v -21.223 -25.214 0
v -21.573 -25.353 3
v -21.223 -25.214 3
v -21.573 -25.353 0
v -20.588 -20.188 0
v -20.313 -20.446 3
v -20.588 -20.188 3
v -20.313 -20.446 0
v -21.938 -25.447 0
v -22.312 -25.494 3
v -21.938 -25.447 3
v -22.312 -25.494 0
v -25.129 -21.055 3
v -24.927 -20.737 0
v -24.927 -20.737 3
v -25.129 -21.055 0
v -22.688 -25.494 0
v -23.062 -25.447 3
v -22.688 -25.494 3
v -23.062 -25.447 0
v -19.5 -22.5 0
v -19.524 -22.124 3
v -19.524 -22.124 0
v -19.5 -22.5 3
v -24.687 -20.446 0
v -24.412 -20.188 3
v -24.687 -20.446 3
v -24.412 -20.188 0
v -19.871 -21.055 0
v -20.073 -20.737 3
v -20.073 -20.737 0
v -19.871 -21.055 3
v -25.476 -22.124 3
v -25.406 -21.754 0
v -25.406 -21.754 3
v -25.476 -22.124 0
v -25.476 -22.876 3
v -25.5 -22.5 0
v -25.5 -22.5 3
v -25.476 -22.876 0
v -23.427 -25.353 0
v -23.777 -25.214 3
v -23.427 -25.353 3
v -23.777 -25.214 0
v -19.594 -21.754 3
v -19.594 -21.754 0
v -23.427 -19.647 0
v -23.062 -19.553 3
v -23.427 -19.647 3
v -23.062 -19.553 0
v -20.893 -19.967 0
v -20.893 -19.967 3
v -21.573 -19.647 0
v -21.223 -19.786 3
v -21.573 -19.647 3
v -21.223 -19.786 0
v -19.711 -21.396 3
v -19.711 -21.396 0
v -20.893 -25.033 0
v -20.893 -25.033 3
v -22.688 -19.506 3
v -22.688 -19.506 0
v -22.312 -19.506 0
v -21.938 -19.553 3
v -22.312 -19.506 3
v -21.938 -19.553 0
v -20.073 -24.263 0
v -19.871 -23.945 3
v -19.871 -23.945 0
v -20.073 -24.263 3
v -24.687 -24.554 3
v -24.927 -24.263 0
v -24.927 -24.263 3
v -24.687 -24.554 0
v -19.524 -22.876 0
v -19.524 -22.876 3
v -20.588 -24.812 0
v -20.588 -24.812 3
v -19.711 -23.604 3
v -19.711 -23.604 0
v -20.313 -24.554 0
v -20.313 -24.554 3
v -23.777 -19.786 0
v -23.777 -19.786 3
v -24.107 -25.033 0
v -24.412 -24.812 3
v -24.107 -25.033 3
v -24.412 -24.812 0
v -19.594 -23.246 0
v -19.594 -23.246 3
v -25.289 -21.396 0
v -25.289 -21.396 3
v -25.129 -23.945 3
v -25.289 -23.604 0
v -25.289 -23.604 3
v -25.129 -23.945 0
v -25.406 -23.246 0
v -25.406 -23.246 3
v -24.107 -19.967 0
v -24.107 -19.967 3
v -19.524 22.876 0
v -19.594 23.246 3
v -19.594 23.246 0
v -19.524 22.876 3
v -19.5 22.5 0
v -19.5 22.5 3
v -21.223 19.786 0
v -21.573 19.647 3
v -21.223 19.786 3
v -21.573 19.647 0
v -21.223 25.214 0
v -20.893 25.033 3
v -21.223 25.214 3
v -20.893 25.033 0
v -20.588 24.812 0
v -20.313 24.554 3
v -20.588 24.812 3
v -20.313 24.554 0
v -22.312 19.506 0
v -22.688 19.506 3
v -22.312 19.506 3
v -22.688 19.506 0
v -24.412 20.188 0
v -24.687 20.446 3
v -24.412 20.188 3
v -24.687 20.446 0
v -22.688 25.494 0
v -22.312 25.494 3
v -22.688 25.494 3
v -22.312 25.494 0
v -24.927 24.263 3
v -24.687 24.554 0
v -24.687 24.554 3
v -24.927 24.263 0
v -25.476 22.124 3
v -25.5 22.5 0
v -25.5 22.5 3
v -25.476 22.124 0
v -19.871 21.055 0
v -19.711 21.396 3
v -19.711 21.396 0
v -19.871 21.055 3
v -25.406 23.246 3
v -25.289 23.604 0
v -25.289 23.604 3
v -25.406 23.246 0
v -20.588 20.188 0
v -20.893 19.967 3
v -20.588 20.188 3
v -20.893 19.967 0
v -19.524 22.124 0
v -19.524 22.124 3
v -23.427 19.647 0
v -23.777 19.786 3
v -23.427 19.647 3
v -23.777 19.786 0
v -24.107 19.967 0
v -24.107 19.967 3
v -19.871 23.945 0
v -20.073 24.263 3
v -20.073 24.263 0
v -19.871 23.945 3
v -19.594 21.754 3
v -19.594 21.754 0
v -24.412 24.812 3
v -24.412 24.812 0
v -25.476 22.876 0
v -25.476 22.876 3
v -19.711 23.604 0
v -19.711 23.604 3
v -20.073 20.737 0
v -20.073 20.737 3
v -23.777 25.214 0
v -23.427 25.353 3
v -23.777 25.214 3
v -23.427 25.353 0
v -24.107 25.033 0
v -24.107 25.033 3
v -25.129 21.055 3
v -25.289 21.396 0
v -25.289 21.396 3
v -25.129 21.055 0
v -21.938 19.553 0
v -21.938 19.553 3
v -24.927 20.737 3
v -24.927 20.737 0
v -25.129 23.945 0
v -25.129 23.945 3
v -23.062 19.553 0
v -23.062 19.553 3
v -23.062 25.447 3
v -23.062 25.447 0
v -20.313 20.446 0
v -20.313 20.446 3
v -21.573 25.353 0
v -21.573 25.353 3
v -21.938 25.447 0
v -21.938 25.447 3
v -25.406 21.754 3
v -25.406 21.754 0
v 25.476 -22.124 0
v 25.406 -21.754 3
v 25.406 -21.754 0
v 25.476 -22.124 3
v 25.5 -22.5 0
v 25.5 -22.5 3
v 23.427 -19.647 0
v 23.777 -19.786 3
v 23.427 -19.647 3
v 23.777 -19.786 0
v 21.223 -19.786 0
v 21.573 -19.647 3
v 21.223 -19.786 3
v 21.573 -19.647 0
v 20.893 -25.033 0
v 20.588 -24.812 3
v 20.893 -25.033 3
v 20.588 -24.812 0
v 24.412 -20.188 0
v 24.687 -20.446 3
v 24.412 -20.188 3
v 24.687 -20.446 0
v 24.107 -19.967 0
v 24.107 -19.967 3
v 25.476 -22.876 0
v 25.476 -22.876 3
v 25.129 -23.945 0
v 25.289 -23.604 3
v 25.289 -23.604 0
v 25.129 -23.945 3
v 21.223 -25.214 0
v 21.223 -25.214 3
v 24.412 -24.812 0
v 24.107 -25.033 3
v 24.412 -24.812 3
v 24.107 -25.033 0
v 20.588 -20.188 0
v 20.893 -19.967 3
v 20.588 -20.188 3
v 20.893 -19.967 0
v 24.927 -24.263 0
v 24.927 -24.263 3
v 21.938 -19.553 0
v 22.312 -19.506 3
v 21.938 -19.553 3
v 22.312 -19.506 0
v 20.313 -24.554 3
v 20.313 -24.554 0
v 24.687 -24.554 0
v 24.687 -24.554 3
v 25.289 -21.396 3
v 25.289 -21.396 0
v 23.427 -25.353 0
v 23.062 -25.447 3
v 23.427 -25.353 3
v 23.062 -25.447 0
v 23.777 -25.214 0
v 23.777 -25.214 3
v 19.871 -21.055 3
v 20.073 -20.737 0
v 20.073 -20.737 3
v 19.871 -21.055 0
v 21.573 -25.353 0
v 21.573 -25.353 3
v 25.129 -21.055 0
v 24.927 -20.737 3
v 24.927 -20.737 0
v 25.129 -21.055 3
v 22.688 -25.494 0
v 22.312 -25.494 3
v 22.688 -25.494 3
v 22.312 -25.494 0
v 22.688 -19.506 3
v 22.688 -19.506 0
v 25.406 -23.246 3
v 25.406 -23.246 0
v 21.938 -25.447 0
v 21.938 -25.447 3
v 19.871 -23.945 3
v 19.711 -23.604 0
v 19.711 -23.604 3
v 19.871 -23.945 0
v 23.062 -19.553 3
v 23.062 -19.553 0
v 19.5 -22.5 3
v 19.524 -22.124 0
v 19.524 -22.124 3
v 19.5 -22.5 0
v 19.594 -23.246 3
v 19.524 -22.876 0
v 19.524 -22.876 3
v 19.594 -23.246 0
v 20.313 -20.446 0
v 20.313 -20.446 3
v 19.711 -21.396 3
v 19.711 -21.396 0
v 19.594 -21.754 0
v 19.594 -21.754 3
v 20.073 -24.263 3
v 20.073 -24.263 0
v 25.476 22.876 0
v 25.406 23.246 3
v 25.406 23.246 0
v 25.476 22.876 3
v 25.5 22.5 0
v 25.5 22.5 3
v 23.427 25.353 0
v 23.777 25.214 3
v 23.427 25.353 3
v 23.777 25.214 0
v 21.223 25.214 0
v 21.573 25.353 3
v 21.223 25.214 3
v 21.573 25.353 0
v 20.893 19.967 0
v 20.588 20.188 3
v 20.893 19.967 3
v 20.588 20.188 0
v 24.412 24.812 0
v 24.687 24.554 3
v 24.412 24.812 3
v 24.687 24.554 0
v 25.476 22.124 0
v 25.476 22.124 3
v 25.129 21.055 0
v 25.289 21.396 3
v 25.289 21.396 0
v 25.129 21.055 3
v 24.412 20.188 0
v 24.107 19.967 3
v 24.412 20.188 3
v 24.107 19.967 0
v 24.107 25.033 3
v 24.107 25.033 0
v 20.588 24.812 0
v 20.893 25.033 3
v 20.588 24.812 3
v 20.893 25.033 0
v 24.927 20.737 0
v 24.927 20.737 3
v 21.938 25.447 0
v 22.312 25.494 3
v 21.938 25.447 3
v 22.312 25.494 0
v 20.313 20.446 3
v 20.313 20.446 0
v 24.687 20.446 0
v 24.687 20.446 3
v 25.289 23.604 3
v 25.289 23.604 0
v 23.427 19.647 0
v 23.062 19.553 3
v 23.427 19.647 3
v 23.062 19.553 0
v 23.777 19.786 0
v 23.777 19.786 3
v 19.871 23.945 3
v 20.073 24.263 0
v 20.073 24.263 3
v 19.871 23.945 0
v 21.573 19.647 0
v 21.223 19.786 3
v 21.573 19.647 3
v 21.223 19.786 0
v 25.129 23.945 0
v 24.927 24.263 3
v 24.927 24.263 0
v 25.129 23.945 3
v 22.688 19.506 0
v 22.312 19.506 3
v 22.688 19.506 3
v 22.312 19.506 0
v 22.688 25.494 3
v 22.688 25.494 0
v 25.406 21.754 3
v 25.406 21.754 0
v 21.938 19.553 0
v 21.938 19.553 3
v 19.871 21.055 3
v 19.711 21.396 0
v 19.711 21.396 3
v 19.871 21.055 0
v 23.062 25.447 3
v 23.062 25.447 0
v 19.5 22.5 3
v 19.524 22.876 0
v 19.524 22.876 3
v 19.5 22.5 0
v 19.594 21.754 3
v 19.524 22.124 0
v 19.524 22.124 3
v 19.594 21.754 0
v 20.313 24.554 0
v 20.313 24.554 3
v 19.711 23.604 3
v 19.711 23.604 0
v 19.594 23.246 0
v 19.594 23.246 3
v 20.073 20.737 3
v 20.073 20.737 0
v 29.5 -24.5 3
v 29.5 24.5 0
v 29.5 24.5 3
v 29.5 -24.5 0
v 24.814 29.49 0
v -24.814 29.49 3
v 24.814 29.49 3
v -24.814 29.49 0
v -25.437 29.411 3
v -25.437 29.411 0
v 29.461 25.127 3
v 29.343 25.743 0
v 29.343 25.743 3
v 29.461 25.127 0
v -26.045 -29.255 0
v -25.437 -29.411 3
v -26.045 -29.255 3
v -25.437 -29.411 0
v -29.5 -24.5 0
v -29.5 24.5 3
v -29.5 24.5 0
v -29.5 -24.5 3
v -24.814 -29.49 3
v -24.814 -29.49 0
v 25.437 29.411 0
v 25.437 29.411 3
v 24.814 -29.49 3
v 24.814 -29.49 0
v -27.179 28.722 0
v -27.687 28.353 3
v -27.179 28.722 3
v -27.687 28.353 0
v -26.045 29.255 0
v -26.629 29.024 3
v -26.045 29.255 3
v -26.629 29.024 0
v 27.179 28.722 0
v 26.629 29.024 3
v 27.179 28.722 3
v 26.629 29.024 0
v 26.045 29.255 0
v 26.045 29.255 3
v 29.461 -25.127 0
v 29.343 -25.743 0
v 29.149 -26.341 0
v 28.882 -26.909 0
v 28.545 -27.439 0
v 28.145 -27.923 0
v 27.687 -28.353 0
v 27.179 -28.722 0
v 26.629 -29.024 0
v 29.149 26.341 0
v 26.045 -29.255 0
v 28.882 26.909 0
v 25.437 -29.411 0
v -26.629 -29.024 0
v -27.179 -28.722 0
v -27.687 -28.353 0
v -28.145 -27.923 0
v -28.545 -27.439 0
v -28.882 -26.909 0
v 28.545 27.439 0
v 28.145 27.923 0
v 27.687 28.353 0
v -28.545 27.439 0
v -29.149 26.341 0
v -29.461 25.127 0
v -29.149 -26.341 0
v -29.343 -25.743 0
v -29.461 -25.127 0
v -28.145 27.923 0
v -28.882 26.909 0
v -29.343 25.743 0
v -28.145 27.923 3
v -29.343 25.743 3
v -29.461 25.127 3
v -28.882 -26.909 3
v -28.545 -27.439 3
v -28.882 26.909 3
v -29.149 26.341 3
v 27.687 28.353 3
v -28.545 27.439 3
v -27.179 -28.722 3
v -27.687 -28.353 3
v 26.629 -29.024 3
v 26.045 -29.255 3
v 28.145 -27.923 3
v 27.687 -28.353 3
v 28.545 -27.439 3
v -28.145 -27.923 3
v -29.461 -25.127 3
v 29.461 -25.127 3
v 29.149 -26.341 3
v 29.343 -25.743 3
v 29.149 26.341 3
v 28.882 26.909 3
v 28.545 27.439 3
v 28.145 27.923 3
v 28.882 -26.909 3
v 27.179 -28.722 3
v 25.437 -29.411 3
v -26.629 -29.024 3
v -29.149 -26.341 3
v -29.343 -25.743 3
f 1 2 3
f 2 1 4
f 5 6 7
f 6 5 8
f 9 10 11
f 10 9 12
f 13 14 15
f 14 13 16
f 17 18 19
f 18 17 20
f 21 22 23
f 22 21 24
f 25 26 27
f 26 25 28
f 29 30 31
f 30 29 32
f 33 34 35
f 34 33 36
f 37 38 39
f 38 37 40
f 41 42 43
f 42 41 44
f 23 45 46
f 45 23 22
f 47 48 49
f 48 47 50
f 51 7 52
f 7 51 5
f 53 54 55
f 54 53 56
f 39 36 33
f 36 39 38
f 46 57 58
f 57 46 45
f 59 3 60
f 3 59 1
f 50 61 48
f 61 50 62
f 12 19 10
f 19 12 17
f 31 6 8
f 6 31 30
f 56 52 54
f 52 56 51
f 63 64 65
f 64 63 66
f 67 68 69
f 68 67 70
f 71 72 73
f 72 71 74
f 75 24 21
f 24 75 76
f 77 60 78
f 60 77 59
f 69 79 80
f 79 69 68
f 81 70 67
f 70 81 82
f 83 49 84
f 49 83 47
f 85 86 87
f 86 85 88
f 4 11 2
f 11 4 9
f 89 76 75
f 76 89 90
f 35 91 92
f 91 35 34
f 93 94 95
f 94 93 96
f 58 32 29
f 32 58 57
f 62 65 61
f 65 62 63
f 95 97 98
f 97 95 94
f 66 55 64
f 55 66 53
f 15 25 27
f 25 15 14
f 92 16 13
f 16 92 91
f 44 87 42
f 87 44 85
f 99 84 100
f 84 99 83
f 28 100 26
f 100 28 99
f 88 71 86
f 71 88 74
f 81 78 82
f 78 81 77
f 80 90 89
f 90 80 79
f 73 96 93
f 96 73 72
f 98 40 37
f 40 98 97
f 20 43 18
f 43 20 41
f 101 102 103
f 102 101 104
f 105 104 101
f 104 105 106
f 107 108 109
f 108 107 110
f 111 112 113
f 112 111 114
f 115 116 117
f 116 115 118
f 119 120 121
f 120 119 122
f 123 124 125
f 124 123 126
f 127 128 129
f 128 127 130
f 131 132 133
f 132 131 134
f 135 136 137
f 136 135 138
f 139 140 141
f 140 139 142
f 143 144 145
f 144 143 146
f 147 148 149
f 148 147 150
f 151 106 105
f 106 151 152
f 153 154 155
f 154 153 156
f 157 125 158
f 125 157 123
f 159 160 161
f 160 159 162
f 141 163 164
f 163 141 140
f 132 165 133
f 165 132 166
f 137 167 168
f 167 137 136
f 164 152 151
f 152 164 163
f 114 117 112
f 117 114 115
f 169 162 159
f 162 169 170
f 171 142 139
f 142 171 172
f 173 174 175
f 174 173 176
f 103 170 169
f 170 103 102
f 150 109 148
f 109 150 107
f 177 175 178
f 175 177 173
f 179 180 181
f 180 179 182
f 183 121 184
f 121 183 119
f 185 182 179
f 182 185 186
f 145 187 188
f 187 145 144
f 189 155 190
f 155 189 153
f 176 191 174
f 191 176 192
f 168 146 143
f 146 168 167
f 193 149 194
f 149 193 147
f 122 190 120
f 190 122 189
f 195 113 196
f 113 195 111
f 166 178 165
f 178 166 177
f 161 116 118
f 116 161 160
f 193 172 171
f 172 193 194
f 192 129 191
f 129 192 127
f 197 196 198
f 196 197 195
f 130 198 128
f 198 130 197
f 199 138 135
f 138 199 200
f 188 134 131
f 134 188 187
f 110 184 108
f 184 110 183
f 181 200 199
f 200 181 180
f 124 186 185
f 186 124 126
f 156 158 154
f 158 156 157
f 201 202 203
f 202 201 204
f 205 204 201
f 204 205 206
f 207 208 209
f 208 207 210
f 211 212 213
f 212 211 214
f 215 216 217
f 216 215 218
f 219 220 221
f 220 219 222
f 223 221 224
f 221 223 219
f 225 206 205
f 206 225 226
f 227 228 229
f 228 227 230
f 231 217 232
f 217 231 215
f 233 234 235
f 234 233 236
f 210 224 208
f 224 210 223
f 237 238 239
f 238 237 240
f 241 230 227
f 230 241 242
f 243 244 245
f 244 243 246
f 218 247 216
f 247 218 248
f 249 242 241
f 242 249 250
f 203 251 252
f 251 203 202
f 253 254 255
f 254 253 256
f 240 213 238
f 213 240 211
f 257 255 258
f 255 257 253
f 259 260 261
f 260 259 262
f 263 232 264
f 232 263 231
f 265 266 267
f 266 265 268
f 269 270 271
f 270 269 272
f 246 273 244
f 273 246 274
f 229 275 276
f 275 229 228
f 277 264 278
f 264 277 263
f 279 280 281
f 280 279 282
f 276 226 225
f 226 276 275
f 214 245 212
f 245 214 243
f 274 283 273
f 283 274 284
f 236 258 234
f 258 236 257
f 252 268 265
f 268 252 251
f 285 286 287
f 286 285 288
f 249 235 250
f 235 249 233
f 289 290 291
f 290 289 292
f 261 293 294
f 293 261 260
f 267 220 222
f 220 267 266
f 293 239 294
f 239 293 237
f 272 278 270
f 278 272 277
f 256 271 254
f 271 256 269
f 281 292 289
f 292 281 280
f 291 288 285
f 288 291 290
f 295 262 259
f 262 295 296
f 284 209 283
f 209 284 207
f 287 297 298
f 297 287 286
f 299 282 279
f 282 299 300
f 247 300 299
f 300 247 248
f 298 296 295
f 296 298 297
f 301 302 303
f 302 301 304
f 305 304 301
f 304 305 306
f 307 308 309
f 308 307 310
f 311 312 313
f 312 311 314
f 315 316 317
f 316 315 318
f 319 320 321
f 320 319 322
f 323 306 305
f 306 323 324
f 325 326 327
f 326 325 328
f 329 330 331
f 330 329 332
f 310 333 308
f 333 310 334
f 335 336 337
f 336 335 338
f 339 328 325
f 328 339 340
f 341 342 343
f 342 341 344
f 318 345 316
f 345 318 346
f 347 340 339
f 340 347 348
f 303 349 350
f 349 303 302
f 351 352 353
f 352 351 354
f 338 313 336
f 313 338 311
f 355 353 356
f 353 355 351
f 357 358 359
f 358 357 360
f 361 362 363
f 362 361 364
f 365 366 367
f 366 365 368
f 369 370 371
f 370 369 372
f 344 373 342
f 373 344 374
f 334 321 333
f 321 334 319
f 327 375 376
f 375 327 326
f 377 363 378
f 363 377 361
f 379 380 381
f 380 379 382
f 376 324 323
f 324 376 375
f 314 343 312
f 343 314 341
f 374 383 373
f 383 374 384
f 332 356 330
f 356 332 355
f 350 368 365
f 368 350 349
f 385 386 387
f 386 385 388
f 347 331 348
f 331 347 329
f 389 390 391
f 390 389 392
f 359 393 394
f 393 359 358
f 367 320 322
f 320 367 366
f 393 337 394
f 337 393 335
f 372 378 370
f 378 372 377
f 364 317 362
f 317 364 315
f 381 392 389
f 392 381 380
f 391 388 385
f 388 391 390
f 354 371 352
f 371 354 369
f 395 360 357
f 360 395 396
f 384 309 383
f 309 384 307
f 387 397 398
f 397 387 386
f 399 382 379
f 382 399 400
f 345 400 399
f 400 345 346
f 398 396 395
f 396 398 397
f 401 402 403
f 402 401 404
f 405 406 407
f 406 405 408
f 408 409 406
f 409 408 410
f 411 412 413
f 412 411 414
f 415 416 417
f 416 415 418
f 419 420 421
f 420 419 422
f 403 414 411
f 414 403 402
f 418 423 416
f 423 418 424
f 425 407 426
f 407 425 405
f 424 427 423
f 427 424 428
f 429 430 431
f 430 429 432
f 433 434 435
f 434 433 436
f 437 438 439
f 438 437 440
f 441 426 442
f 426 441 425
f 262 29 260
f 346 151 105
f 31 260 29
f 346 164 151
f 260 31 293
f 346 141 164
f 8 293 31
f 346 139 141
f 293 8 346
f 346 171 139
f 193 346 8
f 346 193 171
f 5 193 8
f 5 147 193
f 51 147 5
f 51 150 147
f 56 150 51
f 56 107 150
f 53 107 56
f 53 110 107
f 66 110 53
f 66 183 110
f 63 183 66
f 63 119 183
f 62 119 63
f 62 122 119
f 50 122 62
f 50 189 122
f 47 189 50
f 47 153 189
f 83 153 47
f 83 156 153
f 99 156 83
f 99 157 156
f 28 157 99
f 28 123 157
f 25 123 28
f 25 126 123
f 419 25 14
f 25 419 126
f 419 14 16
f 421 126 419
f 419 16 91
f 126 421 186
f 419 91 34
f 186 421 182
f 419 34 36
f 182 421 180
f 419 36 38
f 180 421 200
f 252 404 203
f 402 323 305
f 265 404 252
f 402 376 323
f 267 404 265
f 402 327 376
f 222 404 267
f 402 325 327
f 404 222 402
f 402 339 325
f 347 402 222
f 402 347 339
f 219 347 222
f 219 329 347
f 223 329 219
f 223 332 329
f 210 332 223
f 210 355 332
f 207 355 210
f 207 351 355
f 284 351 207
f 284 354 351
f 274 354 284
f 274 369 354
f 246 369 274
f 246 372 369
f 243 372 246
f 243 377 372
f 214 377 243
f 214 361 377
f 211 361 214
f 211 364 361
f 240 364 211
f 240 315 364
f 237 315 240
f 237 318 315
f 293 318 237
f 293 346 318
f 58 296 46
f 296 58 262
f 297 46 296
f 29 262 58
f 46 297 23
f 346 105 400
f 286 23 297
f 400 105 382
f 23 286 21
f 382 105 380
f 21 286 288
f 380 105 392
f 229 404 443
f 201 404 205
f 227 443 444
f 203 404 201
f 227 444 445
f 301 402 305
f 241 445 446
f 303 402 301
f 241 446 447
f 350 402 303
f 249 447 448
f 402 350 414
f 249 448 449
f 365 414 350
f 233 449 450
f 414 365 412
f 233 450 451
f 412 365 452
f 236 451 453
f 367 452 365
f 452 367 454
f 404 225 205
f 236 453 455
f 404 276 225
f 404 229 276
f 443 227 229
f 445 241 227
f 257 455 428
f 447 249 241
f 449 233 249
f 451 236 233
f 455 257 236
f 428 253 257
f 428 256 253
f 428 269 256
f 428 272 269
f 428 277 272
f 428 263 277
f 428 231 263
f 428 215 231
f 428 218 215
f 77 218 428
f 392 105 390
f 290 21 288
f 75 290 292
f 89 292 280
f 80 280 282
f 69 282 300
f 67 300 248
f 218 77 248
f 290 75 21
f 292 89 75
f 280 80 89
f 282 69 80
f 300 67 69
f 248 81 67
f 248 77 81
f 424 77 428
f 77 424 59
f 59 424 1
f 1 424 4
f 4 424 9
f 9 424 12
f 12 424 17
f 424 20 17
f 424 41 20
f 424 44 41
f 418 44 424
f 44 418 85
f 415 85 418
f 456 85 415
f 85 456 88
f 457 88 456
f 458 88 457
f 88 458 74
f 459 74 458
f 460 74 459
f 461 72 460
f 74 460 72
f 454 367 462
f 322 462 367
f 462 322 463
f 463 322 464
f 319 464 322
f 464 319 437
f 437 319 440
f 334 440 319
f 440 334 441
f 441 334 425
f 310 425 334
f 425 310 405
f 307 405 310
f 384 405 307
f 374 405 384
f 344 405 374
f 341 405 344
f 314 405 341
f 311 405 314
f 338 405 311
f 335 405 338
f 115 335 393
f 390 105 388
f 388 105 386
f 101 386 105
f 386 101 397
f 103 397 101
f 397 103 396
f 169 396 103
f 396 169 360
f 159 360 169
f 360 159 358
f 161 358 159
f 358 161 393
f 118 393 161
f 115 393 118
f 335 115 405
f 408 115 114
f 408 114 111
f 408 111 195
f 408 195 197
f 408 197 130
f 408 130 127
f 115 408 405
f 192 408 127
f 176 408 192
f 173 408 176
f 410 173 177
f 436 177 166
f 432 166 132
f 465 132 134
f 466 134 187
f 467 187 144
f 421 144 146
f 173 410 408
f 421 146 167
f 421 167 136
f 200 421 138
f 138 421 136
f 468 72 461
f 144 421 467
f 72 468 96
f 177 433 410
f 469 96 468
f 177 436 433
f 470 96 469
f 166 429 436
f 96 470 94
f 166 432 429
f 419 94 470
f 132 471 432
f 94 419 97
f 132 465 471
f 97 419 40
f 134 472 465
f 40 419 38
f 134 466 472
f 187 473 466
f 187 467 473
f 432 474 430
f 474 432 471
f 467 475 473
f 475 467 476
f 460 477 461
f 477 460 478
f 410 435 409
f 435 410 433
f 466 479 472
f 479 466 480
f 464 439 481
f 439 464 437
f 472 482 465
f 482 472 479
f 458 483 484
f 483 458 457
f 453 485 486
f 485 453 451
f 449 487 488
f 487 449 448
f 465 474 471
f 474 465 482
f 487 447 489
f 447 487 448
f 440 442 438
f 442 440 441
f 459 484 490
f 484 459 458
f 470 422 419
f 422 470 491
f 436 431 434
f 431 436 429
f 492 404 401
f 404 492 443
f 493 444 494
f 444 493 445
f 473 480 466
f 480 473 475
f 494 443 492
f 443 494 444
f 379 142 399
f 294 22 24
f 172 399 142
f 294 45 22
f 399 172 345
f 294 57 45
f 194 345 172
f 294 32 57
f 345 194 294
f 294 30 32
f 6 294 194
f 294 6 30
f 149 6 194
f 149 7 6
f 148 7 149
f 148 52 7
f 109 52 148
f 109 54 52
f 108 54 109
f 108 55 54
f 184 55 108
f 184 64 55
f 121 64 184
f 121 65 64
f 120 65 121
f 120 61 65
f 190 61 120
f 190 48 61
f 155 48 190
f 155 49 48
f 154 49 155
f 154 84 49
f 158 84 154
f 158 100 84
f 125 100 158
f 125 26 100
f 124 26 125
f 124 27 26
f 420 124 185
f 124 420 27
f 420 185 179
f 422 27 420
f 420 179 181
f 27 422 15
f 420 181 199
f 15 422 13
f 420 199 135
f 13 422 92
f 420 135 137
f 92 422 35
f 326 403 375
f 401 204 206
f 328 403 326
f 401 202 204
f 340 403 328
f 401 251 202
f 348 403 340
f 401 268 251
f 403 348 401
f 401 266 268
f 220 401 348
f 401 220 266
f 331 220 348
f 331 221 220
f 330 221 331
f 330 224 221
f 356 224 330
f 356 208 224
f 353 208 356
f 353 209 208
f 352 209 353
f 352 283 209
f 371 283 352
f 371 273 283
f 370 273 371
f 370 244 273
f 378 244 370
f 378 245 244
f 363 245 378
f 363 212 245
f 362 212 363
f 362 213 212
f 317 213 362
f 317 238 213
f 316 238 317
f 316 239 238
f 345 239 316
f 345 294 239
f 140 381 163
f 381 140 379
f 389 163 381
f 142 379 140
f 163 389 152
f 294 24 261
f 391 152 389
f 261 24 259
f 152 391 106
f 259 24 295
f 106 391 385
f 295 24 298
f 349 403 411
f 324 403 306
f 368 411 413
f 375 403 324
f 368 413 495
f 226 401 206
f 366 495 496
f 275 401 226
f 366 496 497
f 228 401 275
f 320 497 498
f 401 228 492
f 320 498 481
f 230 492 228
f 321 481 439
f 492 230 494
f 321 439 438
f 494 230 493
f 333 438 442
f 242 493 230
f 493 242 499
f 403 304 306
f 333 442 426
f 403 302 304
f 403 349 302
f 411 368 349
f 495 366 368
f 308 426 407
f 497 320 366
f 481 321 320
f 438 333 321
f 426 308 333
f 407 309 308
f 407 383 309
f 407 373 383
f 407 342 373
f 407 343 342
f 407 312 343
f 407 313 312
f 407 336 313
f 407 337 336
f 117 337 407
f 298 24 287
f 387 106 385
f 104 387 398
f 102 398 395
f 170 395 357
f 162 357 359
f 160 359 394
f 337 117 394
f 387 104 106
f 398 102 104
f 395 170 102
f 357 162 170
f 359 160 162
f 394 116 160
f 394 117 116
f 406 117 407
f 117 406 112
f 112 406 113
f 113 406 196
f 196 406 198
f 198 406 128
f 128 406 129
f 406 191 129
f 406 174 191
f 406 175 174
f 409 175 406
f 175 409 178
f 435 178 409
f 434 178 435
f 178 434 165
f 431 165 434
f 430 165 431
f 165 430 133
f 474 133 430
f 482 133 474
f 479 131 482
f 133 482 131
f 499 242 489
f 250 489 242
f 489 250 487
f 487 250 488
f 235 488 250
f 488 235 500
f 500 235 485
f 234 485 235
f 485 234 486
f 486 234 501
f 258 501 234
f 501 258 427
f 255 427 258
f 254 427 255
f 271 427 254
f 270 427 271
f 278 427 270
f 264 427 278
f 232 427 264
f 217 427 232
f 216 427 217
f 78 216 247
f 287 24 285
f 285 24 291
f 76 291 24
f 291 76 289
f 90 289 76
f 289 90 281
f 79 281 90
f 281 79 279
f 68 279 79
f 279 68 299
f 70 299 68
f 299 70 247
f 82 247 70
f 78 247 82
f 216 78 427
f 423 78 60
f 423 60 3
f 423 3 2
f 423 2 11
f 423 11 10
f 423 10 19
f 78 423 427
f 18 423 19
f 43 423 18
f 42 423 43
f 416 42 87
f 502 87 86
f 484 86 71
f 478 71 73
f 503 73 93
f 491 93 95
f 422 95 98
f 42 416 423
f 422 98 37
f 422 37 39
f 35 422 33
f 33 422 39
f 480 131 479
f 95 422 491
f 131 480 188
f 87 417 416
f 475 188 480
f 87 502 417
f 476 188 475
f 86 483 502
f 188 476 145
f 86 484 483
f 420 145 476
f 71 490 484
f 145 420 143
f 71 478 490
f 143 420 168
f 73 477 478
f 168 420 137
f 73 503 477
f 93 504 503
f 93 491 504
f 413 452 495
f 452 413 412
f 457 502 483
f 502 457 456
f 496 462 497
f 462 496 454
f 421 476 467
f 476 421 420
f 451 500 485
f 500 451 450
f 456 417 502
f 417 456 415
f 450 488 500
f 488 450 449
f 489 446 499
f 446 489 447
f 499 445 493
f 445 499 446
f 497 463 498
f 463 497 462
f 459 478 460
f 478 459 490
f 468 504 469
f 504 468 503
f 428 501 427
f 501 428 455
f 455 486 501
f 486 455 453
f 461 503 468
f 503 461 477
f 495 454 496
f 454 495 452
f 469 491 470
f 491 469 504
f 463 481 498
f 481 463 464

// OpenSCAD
$fn = 50;


difference() {
	union() {
		hull() {
			translate(v = [-24.5000000000, 24.5000000000, 0]) {
				cylinder(h = 3, r = 5);
			}
			translate(v = [24.5000000000, 24.5000000000, 0]) {
				cylinder(h = 3, r = 5);
			}
			translate(v = [-24.5000000000, -24.5000000000, 0]) {
				cylinder(h = 3, r = 5);
			}
			translate(v = [24.5000000000, -24.5000000000, 0]) {
				cylinder(h = 3, r = 5);
			}
		}
	}
	union() {
		translate(v = [-22.5000000000, -22.5000000000, -100.0000000000]) {
			cylinder(h = 200, r = 3.0000000000);
		}
		translate(v = [-22.5000000000, 22.5000000000, -100.0000000000]) {
			cylinder(h = 200, r = 3.0000000000);
		}
		translate(v = [22.5000000000, -22.5000000000, -100.0000000000]) {
			cylinder(h = 200, r = 3.0000000000);
		}
		translate(v = [22.5000000000, 22.5000000000, -100.0000000000]) {
			cylinder(h = 200, r = 3.0000000000);
		}
	}
}
